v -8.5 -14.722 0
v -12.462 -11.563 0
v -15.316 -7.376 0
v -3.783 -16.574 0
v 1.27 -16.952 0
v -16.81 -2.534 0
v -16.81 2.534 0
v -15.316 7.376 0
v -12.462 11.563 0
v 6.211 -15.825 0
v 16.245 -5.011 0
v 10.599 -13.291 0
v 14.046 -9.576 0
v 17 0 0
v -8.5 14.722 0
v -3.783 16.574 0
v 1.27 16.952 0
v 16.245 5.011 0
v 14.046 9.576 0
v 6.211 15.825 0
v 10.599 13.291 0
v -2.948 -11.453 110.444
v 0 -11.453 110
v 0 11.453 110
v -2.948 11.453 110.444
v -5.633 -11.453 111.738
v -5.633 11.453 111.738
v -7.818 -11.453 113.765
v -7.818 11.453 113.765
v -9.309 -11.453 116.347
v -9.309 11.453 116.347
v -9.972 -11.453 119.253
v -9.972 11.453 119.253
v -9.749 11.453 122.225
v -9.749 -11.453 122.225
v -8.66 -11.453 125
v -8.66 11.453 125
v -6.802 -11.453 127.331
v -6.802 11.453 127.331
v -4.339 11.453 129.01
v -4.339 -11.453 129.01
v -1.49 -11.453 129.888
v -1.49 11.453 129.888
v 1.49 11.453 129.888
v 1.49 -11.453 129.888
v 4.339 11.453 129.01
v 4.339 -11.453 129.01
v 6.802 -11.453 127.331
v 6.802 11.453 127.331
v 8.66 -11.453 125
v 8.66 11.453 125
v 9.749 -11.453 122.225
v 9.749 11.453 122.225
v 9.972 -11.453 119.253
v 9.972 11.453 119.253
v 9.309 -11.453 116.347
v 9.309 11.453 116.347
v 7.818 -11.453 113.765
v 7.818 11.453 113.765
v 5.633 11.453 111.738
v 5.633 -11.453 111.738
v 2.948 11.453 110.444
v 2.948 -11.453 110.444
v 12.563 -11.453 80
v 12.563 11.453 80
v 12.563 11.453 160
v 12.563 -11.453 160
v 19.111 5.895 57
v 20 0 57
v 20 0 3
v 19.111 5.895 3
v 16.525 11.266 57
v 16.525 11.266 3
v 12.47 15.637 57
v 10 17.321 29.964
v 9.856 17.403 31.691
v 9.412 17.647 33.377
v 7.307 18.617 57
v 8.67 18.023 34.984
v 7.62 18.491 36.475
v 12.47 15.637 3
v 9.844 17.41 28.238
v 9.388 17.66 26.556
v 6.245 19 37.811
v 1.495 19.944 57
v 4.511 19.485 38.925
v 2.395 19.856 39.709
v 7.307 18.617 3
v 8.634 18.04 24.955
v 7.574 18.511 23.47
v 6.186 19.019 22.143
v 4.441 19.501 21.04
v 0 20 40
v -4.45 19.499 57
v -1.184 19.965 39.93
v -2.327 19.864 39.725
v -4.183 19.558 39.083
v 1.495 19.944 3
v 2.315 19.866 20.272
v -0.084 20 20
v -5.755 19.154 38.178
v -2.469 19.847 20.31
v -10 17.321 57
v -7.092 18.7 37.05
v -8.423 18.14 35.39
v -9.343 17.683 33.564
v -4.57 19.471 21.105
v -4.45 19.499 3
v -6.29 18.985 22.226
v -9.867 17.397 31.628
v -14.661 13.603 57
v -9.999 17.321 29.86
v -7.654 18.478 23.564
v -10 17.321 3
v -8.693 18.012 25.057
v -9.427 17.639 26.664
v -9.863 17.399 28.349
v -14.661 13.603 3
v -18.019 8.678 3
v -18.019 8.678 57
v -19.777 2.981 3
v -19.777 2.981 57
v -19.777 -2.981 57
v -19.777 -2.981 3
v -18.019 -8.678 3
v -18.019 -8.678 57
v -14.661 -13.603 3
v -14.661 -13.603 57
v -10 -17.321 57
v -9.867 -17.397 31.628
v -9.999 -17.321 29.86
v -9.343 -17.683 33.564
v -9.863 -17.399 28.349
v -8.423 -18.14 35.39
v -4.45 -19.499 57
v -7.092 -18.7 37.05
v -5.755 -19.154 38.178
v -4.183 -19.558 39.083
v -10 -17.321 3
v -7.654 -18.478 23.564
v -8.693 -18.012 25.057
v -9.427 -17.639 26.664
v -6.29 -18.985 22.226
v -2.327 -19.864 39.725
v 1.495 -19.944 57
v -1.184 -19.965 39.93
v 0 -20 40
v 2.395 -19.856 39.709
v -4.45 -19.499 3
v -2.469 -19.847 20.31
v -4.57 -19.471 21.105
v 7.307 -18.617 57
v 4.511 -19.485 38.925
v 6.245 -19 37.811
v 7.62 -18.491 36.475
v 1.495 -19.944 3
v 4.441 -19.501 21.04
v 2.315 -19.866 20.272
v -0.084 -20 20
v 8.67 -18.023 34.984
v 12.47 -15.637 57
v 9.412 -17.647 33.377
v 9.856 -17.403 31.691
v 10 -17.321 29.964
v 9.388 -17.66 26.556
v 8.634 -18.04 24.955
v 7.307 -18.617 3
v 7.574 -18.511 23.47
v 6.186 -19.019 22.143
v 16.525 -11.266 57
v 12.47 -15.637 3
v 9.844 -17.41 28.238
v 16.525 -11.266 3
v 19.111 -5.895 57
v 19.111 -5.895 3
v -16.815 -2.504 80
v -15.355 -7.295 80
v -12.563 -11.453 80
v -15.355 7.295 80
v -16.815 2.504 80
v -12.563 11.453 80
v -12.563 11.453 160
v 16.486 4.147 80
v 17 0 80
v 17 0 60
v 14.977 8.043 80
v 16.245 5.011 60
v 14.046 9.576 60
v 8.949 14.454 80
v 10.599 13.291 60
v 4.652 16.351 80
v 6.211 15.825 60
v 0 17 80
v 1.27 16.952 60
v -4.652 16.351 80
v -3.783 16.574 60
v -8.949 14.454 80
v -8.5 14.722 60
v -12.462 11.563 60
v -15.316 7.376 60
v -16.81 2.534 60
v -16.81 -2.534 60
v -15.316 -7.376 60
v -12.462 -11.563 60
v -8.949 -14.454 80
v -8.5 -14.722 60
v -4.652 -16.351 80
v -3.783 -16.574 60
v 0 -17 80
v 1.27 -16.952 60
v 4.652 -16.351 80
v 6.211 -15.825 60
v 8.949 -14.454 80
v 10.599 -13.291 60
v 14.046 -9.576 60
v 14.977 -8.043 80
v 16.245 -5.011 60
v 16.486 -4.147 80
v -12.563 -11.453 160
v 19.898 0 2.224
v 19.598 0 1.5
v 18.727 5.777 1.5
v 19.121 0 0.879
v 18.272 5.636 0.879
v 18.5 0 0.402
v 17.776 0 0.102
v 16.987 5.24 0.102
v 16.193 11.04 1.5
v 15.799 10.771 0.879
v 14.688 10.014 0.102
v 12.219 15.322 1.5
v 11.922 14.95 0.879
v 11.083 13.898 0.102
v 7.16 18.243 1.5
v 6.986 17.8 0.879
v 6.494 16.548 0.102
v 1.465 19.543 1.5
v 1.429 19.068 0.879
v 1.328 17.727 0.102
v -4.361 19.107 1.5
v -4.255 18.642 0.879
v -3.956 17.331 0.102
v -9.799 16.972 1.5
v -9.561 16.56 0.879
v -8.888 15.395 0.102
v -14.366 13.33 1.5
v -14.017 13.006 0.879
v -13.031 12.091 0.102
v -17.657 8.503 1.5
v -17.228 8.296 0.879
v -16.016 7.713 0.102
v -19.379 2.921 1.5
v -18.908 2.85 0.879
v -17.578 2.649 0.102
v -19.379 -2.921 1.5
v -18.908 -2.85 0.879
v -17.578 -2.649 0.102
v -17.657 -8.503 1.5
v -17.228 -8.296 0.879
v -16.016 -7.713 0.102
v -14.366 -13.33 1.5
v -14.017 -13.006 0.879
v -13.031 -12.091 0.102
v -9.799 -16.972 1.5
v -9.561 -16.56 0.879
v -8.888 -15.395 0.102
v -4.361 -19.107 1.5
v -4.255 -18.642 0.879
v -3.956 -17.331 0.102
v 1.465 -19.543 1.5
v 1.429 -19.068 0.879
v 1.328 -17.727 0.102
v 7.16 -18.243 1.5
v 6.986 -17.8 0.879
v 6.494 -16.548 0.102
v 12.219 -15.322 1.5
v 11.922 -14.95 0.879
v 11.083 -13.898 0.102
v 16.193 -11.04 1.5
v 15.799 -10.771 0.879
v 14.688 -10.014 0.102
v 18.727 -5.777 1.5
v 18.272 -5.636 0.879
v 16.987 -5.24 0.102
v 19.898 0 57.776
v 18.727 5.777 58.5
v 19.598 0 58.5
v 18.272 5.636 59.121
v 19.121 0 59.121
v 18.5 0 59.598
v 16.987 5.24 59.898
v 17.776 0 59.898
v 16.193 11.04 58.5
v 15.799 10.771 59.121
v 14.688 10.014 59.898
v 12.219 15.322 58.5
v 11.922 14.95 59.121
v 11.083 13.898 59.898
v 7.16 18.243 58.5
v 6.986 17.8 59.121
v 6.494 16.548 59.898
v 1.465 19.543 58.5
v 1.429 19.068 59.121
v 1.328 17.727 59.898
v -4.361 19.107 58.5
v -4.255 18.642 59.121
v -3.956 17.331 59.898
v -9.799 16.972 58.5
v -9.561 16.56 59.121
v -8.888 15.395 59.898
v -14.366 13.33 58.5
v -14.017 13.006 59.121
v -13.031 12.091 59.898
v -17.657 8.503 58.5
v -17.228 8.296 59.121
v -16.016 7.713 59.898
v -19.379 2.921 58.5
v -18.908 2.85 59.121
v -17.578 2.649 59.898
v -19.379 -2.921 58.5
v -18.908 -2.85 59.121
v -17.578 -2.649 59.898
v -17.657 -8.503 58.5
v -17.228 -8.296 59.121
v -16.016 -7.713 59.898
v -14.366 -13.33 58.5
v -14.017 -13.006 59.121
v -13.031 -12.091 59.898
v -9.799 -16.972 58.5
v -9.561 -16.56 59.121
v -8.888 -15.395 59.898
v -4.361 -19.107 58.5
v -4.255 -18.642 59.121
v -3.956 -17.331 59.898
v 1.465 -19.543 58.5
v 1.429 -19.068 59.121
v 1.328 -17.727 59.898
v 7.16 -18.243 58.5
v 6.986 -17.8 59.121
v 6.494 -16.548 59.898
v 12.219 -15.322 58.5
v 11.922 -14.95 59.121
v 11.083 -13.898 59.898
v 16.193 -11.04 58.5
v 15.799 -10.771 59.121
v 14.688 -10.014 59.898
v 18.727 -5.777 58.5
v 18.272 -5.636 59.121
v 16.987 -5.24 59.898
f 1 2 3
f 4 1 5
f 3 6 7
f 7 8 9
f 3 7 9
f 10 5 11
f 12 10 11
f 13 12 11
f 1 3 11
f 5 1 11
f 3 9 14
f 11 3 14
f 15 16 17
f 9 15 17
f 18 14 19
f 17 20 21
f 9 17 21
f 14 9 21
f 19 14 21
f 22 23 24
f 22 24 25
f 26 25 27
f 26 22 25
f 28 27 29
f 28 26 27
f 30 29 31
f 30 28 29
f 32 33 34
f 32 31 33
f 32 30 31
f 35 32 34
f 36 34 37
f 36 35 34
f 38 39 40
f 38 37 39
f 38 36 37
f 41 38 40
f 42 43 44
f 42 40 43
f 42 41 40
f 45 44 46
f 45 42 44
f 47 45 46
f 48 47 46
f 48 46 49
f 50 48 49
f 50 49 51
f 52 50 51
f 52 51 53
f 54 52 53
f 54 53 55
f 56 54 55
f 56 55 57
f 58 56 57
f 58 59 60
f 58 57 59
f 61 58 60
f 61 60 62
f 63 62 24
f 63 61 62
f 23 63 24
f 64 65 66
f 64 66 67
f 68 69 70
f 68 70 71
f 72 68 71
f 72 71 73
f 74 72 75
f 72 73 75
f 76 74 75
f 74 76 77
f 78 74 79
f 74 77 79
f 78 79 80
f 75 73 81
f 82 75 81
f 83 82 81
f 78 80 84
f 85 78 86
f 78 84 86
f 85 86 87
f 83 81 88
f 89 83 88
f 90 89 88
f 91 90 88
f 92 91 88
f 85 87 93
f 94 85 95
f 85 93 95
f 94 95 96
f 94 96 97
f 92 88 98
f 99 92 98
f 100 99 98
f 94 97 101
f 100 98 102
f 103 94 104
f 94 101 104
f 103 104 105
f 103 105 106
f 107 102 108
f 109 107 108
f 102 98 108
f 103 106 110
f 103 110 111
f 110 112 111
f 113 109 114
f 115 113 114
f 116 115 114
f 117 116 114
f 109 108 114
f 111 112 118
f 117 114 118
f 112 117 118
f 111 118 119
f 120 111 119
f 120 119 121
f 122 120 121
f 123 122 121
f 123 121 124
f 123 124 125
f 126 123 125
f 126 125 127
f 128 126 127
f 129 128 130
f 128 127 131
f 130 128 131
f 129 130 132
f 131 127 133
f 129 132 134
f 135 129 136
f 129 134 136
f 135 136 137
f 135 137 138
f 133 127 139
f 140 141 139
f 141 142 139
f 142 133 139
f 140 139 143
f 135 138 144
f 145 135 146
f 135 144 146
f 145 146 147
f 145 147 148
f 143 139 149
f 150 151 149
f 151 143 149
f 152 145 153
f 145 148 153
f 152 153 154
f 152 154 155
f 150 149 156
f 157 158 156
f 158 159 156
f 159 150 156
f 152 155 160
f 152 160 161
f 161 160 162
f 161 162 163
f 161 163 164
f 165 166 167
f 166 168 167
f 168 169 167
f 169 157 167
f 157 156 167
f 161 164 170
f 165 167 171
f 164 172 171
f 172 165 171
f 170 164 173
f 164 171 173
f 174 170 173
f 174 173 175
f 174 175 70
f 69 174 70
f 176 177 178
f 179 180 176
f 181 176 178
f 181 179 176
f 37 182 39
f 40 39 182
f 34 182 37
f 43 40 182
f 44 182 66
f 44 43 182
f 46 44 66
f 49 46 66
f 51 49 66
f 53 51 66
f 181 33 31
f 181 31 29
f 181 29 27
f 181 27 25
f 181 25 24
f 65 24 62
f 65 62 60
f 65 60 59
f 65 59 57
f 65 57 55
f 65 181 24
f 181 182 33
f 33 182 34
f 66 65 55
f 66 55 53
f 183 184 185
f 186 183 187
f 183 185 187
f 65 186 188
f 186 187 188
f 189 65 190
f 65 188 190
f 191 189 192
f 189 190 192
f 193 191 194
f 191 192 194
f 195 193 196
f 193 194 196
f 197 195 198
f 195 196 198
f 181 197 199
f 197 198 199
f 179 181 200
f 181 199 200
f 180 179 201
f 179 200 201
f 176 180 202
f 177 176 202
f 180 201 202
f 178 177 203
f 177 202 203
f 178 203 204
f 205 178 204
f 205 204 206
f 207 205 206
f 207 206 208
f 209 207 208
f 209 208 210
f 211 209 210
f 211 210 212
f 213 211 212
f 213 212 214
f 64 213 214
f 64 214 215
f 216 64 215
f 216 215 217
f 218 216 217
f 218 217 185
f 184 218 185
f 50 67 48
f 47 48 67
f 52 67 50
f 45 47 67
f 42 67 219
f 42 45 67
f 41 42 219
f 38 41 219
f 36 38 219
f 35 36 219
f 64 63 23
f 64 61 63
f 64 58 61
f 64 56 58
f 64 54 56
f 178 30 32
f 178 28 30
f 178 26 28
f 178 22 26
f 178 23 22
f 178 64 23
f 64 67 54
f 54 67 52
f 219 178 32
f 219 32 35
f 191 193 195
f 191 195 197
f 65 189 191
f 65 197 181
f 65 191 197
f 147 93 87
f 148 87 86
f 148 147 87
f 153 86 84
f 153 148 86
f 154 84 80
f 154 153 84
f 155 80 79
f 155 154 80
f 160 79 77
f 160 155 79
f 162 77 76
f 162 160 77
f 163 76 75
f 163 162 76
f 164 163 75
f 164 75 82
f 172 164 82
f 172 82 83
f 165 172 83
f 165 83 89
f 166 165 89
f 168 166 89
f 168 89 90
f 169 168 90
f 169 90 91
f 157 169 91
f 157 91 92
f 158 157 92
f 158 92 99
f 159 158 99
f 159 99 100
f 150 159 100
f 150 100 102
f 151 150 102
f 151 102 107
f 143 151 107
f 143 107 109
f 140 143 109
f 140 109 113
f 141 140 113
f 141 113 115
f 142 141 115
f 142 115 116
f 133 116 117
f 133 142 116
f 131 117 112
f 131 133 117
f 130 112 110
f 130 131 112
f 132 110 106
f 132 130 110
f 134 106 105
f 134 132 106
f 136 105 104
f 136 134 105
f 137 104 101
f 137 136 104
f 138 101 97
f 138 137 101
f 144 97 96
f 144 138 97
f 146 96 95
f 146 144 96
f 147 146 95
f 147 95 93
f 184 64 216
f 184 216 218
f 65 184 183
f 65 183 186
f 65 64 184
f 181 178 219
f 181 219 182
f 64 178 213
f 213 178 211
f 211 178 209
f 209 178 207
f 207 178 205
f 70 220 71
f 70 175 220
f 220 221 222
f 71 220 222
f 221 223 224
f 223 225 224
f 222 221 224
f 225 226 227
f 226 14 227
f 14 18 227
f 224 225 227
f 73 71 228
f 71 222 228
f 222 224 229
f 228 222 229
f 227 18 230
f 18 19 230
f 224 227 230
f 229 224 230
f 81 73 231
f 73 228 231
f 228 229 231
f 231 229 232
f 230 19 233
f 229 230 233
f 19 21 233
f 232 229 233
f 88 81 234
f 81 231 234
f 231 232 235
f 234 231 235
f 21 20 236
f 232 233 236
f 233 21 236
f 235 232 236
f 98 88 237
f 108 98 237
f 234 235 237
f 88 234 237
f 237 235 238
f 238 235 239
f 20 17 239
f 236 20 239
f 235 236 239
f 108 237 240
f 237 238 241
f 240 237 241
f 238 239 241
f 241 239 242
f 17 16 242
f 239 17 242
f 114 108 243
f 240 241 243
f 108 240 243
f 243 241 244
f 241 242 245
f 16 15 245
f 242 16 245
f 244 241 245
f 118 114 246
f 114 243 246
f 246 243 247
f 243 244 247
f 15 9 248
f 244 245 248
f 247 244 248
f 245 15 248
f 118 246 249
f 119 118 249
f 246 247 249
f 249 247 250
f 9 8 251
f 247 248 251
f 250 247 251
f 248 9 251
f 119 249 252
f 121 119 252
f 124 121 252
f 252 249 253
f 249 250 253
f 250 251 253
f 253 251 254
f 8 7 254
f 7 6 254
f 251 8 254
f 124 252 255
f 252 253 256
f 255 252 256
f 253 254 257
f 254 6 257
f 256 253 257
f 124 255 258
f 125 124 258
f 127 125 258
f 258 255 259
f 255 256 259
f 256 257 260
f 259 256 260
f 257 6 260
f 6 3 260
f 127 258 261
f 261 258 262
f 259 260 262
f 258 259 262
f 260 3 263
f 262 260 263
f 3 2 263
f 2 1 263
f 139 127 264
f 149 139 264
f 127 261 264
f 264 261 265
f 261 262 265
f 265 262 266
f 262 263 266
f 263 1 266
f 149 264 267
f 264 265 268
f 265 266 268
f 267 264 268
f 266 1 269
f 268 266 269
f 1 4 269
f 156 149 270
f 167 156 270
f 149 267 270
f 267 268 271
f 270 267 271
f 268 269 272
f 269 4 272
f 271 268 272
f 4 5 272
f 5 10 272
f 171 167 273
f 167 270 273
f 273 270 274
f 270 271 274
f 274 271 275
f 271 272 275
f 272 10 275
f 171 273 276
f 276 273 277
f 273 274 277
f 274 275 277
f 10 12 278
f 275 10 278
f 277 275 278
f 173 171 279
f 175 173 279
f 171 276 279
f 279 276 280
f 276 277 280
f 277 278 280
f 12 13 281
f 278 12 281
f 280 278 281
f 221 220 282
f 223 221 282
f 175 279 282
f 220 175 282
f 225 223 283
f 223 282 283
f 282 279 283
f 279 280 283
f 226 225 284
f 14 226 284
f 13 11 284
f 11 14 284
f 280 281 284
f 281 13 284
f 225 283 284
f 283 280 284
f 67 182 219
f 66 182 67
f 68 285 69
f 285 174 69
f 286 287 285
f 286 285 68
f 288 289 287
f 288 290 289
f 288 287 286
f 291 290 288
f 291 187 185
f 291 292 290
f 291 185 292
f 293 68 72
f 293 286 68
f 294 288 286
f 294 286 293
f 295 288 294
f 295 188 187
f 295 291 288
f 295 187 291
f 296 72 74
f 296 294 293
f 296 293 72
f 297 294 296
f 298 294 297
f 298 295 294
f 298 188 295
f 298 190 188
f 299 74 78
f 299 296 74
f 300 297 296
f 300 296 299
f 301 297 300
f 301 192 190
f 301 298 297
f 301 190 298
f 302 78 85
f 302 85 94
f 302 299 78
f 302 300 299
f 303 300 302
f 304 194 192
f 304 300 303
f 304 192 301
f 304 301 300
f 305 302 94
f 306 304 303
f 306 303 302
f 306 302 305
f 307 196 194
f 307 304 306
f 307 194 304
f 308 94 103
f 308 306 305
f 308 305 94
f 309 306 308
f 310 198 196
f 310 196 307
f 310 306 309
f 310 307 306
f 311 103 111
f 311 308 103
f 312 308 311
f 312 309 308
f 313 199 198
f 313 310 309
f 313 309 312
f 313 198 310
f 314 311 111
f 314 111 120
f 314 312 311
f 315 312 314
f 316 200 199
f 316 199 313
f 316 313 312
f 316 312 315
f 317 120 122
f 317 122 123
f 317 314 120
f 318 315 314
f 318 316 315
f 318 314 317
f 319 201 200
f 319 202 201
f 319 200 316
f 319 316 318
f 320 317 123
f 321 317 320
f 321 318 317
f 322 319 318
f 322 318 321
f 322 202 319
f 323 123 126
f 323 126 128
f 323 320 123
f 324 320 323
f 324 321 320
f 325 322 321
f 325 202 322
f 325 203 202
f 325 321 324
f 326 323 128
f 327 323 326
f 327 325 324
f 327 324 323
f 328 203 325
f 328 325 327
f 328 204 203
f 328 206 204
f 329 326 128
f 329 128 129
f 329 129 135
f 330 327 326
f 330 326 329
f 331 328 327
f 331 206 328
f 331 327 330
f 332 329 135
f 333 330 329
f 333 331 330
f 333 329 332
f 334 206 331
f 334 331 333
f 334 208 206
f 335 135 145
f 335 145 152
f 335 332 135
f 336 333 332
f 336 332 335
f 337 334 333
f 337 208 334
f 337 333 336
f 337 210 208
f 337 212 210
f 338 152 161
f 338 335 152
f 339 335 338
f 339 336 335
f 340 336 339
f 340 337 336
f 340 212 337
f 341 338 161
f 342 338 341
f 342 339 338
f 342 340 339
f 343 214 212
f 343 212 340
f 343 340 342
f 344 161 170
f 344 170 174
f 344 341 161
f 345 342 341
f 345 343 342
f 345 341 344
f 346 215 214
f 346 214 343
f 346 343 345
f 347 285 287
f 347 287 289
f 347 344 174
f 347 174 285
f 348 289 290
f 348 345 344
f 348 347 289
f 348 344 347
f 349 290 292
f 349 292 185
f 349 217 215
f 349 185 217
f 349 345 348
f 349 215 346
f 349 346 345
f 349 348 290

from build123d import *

# Parameters (mm, degrees)
SKETCH1_R               = 20
BOSS_EXTRUDE1_DEPTH     = 60
CUT_EXTRUDE1_DEPTH      = 67.332495807
CUT_EXTRUDE1_DEPTH_BACK = 67.332495807
SKETCH2_R               = 10
FILLET1_R               = 3
SKETCH22_R              = 17
BOSS_EXTRUDE4_DEPTH     = 100
CUT_EXTRUDE4_DEPTH      = 100
CUT_EXTRUDE4_DEPTH_BACK = 100
SKETCH19_R              = 10
CUT_EXTRUDE5_START      = -80
CUT_EXTRUDE5_DEPTH      = 80


with BuildPart() as part:
    # Sketch1 → Boss-Extrude1 (new body)
    with BuildSketch(Plane.XY):
        Circle(SKETCH1_R)
    extrude(amount=BOSS_EXTRUDE1_DEPTH)

    # Sketch2 → Cut-Extrude1 (cut, two sides: drawn at the far end of the back side and taken through both)
    with BuildSketch(Plane(origin=(0, 0, 0), x_dir=(1, 0, 0), z_dir=(0, 1, 0)).offset(-CUT_EXTRUDE1_DEPTH_BACK)):
        with Locations((0, -30)):
            Circle(SKETCH2_R)
    extrude(amount=CUT_EXTRUDE1_DEPTH + CUT_EXTRUDE1_DEPTH_BACK, mode=Mode.SUBTRACT)

    # Fillet1
    fillet1_edges = [part.edges().sort_by_distance(p)[0] for p in [
        (-20, 0, 0),
        (-20, 0, 60),
    ]]
    fillet(fillet1_edges, radius=FILLET1_R)

    # Sketch22 → Boss-Extrude4 (add)
    with BuildSketch(Plane.XY.offset(60)):
        Circle(SKETCH22_R)
    extrude(amount=BOSS_EXTRUDE4_DEPTH)

    # Sketch19 → Cut-Extrude4 (cut, two sides: drawn at the far end of the back side and taken through both)
    with BuildSketch(Plane(origin=(0, 0, 0), x_dir=(1, 0, 0), z_dir=(0, 1, 0)).offset(-CUT_EXTRUDE4_DEPTH_BACK)):
        with Locations((0, -120)):
            Circle(SKETCH19_R)
    extrude(amount=CUT_EXTRUDE4_DEPTH + CUT_EXTRUDE4_DEPTH_BACK, mode=Mode.SUBTRACT)

    # Sketch23 → Cut-Extrude5 (cut)
    with BuildSketch(Plane.XY.offset(160).offset(CUT_EXTRUDE5_START)):
        with BuildLine():
            ThreePointArc((12.56265543, 11.453370183), (0, 17), (-12.56265543, 11.453370183))
            Line((-12.56265543, 11.453370183), (12.56265543, 11.453370183))
        make_face()
        with BuildLine():
            Line((-12.56265543, -11.453370183), (-12.56265543, 11.453370183))
            ThreePointArc((-12.56265543, 11.453370183), (-17, 0), (-12.56265543, -11.453370183))
        make_face()
        with BuildLine():
            ThreePointArc((12.56265543, -11.453370183), (17, 0), (12.56265543, 11.453370183))
            Line((12.56265543, 11.453370183), (12.56265543, -11.453370183))
        make_face()
        with BuildLine():
            Line((12.56265543, -11.453370183), (-12.56265543, -11.453370183))
            ThreePointArc((-12.56265543, -11.453370183), (0, -17), (12.56265543, -11.453370183))
        make_face()
    extrude(amount=CUT_EXTRUDE5_DEPTH, mode=Mode.SUBTRACT)


solid = part.part
